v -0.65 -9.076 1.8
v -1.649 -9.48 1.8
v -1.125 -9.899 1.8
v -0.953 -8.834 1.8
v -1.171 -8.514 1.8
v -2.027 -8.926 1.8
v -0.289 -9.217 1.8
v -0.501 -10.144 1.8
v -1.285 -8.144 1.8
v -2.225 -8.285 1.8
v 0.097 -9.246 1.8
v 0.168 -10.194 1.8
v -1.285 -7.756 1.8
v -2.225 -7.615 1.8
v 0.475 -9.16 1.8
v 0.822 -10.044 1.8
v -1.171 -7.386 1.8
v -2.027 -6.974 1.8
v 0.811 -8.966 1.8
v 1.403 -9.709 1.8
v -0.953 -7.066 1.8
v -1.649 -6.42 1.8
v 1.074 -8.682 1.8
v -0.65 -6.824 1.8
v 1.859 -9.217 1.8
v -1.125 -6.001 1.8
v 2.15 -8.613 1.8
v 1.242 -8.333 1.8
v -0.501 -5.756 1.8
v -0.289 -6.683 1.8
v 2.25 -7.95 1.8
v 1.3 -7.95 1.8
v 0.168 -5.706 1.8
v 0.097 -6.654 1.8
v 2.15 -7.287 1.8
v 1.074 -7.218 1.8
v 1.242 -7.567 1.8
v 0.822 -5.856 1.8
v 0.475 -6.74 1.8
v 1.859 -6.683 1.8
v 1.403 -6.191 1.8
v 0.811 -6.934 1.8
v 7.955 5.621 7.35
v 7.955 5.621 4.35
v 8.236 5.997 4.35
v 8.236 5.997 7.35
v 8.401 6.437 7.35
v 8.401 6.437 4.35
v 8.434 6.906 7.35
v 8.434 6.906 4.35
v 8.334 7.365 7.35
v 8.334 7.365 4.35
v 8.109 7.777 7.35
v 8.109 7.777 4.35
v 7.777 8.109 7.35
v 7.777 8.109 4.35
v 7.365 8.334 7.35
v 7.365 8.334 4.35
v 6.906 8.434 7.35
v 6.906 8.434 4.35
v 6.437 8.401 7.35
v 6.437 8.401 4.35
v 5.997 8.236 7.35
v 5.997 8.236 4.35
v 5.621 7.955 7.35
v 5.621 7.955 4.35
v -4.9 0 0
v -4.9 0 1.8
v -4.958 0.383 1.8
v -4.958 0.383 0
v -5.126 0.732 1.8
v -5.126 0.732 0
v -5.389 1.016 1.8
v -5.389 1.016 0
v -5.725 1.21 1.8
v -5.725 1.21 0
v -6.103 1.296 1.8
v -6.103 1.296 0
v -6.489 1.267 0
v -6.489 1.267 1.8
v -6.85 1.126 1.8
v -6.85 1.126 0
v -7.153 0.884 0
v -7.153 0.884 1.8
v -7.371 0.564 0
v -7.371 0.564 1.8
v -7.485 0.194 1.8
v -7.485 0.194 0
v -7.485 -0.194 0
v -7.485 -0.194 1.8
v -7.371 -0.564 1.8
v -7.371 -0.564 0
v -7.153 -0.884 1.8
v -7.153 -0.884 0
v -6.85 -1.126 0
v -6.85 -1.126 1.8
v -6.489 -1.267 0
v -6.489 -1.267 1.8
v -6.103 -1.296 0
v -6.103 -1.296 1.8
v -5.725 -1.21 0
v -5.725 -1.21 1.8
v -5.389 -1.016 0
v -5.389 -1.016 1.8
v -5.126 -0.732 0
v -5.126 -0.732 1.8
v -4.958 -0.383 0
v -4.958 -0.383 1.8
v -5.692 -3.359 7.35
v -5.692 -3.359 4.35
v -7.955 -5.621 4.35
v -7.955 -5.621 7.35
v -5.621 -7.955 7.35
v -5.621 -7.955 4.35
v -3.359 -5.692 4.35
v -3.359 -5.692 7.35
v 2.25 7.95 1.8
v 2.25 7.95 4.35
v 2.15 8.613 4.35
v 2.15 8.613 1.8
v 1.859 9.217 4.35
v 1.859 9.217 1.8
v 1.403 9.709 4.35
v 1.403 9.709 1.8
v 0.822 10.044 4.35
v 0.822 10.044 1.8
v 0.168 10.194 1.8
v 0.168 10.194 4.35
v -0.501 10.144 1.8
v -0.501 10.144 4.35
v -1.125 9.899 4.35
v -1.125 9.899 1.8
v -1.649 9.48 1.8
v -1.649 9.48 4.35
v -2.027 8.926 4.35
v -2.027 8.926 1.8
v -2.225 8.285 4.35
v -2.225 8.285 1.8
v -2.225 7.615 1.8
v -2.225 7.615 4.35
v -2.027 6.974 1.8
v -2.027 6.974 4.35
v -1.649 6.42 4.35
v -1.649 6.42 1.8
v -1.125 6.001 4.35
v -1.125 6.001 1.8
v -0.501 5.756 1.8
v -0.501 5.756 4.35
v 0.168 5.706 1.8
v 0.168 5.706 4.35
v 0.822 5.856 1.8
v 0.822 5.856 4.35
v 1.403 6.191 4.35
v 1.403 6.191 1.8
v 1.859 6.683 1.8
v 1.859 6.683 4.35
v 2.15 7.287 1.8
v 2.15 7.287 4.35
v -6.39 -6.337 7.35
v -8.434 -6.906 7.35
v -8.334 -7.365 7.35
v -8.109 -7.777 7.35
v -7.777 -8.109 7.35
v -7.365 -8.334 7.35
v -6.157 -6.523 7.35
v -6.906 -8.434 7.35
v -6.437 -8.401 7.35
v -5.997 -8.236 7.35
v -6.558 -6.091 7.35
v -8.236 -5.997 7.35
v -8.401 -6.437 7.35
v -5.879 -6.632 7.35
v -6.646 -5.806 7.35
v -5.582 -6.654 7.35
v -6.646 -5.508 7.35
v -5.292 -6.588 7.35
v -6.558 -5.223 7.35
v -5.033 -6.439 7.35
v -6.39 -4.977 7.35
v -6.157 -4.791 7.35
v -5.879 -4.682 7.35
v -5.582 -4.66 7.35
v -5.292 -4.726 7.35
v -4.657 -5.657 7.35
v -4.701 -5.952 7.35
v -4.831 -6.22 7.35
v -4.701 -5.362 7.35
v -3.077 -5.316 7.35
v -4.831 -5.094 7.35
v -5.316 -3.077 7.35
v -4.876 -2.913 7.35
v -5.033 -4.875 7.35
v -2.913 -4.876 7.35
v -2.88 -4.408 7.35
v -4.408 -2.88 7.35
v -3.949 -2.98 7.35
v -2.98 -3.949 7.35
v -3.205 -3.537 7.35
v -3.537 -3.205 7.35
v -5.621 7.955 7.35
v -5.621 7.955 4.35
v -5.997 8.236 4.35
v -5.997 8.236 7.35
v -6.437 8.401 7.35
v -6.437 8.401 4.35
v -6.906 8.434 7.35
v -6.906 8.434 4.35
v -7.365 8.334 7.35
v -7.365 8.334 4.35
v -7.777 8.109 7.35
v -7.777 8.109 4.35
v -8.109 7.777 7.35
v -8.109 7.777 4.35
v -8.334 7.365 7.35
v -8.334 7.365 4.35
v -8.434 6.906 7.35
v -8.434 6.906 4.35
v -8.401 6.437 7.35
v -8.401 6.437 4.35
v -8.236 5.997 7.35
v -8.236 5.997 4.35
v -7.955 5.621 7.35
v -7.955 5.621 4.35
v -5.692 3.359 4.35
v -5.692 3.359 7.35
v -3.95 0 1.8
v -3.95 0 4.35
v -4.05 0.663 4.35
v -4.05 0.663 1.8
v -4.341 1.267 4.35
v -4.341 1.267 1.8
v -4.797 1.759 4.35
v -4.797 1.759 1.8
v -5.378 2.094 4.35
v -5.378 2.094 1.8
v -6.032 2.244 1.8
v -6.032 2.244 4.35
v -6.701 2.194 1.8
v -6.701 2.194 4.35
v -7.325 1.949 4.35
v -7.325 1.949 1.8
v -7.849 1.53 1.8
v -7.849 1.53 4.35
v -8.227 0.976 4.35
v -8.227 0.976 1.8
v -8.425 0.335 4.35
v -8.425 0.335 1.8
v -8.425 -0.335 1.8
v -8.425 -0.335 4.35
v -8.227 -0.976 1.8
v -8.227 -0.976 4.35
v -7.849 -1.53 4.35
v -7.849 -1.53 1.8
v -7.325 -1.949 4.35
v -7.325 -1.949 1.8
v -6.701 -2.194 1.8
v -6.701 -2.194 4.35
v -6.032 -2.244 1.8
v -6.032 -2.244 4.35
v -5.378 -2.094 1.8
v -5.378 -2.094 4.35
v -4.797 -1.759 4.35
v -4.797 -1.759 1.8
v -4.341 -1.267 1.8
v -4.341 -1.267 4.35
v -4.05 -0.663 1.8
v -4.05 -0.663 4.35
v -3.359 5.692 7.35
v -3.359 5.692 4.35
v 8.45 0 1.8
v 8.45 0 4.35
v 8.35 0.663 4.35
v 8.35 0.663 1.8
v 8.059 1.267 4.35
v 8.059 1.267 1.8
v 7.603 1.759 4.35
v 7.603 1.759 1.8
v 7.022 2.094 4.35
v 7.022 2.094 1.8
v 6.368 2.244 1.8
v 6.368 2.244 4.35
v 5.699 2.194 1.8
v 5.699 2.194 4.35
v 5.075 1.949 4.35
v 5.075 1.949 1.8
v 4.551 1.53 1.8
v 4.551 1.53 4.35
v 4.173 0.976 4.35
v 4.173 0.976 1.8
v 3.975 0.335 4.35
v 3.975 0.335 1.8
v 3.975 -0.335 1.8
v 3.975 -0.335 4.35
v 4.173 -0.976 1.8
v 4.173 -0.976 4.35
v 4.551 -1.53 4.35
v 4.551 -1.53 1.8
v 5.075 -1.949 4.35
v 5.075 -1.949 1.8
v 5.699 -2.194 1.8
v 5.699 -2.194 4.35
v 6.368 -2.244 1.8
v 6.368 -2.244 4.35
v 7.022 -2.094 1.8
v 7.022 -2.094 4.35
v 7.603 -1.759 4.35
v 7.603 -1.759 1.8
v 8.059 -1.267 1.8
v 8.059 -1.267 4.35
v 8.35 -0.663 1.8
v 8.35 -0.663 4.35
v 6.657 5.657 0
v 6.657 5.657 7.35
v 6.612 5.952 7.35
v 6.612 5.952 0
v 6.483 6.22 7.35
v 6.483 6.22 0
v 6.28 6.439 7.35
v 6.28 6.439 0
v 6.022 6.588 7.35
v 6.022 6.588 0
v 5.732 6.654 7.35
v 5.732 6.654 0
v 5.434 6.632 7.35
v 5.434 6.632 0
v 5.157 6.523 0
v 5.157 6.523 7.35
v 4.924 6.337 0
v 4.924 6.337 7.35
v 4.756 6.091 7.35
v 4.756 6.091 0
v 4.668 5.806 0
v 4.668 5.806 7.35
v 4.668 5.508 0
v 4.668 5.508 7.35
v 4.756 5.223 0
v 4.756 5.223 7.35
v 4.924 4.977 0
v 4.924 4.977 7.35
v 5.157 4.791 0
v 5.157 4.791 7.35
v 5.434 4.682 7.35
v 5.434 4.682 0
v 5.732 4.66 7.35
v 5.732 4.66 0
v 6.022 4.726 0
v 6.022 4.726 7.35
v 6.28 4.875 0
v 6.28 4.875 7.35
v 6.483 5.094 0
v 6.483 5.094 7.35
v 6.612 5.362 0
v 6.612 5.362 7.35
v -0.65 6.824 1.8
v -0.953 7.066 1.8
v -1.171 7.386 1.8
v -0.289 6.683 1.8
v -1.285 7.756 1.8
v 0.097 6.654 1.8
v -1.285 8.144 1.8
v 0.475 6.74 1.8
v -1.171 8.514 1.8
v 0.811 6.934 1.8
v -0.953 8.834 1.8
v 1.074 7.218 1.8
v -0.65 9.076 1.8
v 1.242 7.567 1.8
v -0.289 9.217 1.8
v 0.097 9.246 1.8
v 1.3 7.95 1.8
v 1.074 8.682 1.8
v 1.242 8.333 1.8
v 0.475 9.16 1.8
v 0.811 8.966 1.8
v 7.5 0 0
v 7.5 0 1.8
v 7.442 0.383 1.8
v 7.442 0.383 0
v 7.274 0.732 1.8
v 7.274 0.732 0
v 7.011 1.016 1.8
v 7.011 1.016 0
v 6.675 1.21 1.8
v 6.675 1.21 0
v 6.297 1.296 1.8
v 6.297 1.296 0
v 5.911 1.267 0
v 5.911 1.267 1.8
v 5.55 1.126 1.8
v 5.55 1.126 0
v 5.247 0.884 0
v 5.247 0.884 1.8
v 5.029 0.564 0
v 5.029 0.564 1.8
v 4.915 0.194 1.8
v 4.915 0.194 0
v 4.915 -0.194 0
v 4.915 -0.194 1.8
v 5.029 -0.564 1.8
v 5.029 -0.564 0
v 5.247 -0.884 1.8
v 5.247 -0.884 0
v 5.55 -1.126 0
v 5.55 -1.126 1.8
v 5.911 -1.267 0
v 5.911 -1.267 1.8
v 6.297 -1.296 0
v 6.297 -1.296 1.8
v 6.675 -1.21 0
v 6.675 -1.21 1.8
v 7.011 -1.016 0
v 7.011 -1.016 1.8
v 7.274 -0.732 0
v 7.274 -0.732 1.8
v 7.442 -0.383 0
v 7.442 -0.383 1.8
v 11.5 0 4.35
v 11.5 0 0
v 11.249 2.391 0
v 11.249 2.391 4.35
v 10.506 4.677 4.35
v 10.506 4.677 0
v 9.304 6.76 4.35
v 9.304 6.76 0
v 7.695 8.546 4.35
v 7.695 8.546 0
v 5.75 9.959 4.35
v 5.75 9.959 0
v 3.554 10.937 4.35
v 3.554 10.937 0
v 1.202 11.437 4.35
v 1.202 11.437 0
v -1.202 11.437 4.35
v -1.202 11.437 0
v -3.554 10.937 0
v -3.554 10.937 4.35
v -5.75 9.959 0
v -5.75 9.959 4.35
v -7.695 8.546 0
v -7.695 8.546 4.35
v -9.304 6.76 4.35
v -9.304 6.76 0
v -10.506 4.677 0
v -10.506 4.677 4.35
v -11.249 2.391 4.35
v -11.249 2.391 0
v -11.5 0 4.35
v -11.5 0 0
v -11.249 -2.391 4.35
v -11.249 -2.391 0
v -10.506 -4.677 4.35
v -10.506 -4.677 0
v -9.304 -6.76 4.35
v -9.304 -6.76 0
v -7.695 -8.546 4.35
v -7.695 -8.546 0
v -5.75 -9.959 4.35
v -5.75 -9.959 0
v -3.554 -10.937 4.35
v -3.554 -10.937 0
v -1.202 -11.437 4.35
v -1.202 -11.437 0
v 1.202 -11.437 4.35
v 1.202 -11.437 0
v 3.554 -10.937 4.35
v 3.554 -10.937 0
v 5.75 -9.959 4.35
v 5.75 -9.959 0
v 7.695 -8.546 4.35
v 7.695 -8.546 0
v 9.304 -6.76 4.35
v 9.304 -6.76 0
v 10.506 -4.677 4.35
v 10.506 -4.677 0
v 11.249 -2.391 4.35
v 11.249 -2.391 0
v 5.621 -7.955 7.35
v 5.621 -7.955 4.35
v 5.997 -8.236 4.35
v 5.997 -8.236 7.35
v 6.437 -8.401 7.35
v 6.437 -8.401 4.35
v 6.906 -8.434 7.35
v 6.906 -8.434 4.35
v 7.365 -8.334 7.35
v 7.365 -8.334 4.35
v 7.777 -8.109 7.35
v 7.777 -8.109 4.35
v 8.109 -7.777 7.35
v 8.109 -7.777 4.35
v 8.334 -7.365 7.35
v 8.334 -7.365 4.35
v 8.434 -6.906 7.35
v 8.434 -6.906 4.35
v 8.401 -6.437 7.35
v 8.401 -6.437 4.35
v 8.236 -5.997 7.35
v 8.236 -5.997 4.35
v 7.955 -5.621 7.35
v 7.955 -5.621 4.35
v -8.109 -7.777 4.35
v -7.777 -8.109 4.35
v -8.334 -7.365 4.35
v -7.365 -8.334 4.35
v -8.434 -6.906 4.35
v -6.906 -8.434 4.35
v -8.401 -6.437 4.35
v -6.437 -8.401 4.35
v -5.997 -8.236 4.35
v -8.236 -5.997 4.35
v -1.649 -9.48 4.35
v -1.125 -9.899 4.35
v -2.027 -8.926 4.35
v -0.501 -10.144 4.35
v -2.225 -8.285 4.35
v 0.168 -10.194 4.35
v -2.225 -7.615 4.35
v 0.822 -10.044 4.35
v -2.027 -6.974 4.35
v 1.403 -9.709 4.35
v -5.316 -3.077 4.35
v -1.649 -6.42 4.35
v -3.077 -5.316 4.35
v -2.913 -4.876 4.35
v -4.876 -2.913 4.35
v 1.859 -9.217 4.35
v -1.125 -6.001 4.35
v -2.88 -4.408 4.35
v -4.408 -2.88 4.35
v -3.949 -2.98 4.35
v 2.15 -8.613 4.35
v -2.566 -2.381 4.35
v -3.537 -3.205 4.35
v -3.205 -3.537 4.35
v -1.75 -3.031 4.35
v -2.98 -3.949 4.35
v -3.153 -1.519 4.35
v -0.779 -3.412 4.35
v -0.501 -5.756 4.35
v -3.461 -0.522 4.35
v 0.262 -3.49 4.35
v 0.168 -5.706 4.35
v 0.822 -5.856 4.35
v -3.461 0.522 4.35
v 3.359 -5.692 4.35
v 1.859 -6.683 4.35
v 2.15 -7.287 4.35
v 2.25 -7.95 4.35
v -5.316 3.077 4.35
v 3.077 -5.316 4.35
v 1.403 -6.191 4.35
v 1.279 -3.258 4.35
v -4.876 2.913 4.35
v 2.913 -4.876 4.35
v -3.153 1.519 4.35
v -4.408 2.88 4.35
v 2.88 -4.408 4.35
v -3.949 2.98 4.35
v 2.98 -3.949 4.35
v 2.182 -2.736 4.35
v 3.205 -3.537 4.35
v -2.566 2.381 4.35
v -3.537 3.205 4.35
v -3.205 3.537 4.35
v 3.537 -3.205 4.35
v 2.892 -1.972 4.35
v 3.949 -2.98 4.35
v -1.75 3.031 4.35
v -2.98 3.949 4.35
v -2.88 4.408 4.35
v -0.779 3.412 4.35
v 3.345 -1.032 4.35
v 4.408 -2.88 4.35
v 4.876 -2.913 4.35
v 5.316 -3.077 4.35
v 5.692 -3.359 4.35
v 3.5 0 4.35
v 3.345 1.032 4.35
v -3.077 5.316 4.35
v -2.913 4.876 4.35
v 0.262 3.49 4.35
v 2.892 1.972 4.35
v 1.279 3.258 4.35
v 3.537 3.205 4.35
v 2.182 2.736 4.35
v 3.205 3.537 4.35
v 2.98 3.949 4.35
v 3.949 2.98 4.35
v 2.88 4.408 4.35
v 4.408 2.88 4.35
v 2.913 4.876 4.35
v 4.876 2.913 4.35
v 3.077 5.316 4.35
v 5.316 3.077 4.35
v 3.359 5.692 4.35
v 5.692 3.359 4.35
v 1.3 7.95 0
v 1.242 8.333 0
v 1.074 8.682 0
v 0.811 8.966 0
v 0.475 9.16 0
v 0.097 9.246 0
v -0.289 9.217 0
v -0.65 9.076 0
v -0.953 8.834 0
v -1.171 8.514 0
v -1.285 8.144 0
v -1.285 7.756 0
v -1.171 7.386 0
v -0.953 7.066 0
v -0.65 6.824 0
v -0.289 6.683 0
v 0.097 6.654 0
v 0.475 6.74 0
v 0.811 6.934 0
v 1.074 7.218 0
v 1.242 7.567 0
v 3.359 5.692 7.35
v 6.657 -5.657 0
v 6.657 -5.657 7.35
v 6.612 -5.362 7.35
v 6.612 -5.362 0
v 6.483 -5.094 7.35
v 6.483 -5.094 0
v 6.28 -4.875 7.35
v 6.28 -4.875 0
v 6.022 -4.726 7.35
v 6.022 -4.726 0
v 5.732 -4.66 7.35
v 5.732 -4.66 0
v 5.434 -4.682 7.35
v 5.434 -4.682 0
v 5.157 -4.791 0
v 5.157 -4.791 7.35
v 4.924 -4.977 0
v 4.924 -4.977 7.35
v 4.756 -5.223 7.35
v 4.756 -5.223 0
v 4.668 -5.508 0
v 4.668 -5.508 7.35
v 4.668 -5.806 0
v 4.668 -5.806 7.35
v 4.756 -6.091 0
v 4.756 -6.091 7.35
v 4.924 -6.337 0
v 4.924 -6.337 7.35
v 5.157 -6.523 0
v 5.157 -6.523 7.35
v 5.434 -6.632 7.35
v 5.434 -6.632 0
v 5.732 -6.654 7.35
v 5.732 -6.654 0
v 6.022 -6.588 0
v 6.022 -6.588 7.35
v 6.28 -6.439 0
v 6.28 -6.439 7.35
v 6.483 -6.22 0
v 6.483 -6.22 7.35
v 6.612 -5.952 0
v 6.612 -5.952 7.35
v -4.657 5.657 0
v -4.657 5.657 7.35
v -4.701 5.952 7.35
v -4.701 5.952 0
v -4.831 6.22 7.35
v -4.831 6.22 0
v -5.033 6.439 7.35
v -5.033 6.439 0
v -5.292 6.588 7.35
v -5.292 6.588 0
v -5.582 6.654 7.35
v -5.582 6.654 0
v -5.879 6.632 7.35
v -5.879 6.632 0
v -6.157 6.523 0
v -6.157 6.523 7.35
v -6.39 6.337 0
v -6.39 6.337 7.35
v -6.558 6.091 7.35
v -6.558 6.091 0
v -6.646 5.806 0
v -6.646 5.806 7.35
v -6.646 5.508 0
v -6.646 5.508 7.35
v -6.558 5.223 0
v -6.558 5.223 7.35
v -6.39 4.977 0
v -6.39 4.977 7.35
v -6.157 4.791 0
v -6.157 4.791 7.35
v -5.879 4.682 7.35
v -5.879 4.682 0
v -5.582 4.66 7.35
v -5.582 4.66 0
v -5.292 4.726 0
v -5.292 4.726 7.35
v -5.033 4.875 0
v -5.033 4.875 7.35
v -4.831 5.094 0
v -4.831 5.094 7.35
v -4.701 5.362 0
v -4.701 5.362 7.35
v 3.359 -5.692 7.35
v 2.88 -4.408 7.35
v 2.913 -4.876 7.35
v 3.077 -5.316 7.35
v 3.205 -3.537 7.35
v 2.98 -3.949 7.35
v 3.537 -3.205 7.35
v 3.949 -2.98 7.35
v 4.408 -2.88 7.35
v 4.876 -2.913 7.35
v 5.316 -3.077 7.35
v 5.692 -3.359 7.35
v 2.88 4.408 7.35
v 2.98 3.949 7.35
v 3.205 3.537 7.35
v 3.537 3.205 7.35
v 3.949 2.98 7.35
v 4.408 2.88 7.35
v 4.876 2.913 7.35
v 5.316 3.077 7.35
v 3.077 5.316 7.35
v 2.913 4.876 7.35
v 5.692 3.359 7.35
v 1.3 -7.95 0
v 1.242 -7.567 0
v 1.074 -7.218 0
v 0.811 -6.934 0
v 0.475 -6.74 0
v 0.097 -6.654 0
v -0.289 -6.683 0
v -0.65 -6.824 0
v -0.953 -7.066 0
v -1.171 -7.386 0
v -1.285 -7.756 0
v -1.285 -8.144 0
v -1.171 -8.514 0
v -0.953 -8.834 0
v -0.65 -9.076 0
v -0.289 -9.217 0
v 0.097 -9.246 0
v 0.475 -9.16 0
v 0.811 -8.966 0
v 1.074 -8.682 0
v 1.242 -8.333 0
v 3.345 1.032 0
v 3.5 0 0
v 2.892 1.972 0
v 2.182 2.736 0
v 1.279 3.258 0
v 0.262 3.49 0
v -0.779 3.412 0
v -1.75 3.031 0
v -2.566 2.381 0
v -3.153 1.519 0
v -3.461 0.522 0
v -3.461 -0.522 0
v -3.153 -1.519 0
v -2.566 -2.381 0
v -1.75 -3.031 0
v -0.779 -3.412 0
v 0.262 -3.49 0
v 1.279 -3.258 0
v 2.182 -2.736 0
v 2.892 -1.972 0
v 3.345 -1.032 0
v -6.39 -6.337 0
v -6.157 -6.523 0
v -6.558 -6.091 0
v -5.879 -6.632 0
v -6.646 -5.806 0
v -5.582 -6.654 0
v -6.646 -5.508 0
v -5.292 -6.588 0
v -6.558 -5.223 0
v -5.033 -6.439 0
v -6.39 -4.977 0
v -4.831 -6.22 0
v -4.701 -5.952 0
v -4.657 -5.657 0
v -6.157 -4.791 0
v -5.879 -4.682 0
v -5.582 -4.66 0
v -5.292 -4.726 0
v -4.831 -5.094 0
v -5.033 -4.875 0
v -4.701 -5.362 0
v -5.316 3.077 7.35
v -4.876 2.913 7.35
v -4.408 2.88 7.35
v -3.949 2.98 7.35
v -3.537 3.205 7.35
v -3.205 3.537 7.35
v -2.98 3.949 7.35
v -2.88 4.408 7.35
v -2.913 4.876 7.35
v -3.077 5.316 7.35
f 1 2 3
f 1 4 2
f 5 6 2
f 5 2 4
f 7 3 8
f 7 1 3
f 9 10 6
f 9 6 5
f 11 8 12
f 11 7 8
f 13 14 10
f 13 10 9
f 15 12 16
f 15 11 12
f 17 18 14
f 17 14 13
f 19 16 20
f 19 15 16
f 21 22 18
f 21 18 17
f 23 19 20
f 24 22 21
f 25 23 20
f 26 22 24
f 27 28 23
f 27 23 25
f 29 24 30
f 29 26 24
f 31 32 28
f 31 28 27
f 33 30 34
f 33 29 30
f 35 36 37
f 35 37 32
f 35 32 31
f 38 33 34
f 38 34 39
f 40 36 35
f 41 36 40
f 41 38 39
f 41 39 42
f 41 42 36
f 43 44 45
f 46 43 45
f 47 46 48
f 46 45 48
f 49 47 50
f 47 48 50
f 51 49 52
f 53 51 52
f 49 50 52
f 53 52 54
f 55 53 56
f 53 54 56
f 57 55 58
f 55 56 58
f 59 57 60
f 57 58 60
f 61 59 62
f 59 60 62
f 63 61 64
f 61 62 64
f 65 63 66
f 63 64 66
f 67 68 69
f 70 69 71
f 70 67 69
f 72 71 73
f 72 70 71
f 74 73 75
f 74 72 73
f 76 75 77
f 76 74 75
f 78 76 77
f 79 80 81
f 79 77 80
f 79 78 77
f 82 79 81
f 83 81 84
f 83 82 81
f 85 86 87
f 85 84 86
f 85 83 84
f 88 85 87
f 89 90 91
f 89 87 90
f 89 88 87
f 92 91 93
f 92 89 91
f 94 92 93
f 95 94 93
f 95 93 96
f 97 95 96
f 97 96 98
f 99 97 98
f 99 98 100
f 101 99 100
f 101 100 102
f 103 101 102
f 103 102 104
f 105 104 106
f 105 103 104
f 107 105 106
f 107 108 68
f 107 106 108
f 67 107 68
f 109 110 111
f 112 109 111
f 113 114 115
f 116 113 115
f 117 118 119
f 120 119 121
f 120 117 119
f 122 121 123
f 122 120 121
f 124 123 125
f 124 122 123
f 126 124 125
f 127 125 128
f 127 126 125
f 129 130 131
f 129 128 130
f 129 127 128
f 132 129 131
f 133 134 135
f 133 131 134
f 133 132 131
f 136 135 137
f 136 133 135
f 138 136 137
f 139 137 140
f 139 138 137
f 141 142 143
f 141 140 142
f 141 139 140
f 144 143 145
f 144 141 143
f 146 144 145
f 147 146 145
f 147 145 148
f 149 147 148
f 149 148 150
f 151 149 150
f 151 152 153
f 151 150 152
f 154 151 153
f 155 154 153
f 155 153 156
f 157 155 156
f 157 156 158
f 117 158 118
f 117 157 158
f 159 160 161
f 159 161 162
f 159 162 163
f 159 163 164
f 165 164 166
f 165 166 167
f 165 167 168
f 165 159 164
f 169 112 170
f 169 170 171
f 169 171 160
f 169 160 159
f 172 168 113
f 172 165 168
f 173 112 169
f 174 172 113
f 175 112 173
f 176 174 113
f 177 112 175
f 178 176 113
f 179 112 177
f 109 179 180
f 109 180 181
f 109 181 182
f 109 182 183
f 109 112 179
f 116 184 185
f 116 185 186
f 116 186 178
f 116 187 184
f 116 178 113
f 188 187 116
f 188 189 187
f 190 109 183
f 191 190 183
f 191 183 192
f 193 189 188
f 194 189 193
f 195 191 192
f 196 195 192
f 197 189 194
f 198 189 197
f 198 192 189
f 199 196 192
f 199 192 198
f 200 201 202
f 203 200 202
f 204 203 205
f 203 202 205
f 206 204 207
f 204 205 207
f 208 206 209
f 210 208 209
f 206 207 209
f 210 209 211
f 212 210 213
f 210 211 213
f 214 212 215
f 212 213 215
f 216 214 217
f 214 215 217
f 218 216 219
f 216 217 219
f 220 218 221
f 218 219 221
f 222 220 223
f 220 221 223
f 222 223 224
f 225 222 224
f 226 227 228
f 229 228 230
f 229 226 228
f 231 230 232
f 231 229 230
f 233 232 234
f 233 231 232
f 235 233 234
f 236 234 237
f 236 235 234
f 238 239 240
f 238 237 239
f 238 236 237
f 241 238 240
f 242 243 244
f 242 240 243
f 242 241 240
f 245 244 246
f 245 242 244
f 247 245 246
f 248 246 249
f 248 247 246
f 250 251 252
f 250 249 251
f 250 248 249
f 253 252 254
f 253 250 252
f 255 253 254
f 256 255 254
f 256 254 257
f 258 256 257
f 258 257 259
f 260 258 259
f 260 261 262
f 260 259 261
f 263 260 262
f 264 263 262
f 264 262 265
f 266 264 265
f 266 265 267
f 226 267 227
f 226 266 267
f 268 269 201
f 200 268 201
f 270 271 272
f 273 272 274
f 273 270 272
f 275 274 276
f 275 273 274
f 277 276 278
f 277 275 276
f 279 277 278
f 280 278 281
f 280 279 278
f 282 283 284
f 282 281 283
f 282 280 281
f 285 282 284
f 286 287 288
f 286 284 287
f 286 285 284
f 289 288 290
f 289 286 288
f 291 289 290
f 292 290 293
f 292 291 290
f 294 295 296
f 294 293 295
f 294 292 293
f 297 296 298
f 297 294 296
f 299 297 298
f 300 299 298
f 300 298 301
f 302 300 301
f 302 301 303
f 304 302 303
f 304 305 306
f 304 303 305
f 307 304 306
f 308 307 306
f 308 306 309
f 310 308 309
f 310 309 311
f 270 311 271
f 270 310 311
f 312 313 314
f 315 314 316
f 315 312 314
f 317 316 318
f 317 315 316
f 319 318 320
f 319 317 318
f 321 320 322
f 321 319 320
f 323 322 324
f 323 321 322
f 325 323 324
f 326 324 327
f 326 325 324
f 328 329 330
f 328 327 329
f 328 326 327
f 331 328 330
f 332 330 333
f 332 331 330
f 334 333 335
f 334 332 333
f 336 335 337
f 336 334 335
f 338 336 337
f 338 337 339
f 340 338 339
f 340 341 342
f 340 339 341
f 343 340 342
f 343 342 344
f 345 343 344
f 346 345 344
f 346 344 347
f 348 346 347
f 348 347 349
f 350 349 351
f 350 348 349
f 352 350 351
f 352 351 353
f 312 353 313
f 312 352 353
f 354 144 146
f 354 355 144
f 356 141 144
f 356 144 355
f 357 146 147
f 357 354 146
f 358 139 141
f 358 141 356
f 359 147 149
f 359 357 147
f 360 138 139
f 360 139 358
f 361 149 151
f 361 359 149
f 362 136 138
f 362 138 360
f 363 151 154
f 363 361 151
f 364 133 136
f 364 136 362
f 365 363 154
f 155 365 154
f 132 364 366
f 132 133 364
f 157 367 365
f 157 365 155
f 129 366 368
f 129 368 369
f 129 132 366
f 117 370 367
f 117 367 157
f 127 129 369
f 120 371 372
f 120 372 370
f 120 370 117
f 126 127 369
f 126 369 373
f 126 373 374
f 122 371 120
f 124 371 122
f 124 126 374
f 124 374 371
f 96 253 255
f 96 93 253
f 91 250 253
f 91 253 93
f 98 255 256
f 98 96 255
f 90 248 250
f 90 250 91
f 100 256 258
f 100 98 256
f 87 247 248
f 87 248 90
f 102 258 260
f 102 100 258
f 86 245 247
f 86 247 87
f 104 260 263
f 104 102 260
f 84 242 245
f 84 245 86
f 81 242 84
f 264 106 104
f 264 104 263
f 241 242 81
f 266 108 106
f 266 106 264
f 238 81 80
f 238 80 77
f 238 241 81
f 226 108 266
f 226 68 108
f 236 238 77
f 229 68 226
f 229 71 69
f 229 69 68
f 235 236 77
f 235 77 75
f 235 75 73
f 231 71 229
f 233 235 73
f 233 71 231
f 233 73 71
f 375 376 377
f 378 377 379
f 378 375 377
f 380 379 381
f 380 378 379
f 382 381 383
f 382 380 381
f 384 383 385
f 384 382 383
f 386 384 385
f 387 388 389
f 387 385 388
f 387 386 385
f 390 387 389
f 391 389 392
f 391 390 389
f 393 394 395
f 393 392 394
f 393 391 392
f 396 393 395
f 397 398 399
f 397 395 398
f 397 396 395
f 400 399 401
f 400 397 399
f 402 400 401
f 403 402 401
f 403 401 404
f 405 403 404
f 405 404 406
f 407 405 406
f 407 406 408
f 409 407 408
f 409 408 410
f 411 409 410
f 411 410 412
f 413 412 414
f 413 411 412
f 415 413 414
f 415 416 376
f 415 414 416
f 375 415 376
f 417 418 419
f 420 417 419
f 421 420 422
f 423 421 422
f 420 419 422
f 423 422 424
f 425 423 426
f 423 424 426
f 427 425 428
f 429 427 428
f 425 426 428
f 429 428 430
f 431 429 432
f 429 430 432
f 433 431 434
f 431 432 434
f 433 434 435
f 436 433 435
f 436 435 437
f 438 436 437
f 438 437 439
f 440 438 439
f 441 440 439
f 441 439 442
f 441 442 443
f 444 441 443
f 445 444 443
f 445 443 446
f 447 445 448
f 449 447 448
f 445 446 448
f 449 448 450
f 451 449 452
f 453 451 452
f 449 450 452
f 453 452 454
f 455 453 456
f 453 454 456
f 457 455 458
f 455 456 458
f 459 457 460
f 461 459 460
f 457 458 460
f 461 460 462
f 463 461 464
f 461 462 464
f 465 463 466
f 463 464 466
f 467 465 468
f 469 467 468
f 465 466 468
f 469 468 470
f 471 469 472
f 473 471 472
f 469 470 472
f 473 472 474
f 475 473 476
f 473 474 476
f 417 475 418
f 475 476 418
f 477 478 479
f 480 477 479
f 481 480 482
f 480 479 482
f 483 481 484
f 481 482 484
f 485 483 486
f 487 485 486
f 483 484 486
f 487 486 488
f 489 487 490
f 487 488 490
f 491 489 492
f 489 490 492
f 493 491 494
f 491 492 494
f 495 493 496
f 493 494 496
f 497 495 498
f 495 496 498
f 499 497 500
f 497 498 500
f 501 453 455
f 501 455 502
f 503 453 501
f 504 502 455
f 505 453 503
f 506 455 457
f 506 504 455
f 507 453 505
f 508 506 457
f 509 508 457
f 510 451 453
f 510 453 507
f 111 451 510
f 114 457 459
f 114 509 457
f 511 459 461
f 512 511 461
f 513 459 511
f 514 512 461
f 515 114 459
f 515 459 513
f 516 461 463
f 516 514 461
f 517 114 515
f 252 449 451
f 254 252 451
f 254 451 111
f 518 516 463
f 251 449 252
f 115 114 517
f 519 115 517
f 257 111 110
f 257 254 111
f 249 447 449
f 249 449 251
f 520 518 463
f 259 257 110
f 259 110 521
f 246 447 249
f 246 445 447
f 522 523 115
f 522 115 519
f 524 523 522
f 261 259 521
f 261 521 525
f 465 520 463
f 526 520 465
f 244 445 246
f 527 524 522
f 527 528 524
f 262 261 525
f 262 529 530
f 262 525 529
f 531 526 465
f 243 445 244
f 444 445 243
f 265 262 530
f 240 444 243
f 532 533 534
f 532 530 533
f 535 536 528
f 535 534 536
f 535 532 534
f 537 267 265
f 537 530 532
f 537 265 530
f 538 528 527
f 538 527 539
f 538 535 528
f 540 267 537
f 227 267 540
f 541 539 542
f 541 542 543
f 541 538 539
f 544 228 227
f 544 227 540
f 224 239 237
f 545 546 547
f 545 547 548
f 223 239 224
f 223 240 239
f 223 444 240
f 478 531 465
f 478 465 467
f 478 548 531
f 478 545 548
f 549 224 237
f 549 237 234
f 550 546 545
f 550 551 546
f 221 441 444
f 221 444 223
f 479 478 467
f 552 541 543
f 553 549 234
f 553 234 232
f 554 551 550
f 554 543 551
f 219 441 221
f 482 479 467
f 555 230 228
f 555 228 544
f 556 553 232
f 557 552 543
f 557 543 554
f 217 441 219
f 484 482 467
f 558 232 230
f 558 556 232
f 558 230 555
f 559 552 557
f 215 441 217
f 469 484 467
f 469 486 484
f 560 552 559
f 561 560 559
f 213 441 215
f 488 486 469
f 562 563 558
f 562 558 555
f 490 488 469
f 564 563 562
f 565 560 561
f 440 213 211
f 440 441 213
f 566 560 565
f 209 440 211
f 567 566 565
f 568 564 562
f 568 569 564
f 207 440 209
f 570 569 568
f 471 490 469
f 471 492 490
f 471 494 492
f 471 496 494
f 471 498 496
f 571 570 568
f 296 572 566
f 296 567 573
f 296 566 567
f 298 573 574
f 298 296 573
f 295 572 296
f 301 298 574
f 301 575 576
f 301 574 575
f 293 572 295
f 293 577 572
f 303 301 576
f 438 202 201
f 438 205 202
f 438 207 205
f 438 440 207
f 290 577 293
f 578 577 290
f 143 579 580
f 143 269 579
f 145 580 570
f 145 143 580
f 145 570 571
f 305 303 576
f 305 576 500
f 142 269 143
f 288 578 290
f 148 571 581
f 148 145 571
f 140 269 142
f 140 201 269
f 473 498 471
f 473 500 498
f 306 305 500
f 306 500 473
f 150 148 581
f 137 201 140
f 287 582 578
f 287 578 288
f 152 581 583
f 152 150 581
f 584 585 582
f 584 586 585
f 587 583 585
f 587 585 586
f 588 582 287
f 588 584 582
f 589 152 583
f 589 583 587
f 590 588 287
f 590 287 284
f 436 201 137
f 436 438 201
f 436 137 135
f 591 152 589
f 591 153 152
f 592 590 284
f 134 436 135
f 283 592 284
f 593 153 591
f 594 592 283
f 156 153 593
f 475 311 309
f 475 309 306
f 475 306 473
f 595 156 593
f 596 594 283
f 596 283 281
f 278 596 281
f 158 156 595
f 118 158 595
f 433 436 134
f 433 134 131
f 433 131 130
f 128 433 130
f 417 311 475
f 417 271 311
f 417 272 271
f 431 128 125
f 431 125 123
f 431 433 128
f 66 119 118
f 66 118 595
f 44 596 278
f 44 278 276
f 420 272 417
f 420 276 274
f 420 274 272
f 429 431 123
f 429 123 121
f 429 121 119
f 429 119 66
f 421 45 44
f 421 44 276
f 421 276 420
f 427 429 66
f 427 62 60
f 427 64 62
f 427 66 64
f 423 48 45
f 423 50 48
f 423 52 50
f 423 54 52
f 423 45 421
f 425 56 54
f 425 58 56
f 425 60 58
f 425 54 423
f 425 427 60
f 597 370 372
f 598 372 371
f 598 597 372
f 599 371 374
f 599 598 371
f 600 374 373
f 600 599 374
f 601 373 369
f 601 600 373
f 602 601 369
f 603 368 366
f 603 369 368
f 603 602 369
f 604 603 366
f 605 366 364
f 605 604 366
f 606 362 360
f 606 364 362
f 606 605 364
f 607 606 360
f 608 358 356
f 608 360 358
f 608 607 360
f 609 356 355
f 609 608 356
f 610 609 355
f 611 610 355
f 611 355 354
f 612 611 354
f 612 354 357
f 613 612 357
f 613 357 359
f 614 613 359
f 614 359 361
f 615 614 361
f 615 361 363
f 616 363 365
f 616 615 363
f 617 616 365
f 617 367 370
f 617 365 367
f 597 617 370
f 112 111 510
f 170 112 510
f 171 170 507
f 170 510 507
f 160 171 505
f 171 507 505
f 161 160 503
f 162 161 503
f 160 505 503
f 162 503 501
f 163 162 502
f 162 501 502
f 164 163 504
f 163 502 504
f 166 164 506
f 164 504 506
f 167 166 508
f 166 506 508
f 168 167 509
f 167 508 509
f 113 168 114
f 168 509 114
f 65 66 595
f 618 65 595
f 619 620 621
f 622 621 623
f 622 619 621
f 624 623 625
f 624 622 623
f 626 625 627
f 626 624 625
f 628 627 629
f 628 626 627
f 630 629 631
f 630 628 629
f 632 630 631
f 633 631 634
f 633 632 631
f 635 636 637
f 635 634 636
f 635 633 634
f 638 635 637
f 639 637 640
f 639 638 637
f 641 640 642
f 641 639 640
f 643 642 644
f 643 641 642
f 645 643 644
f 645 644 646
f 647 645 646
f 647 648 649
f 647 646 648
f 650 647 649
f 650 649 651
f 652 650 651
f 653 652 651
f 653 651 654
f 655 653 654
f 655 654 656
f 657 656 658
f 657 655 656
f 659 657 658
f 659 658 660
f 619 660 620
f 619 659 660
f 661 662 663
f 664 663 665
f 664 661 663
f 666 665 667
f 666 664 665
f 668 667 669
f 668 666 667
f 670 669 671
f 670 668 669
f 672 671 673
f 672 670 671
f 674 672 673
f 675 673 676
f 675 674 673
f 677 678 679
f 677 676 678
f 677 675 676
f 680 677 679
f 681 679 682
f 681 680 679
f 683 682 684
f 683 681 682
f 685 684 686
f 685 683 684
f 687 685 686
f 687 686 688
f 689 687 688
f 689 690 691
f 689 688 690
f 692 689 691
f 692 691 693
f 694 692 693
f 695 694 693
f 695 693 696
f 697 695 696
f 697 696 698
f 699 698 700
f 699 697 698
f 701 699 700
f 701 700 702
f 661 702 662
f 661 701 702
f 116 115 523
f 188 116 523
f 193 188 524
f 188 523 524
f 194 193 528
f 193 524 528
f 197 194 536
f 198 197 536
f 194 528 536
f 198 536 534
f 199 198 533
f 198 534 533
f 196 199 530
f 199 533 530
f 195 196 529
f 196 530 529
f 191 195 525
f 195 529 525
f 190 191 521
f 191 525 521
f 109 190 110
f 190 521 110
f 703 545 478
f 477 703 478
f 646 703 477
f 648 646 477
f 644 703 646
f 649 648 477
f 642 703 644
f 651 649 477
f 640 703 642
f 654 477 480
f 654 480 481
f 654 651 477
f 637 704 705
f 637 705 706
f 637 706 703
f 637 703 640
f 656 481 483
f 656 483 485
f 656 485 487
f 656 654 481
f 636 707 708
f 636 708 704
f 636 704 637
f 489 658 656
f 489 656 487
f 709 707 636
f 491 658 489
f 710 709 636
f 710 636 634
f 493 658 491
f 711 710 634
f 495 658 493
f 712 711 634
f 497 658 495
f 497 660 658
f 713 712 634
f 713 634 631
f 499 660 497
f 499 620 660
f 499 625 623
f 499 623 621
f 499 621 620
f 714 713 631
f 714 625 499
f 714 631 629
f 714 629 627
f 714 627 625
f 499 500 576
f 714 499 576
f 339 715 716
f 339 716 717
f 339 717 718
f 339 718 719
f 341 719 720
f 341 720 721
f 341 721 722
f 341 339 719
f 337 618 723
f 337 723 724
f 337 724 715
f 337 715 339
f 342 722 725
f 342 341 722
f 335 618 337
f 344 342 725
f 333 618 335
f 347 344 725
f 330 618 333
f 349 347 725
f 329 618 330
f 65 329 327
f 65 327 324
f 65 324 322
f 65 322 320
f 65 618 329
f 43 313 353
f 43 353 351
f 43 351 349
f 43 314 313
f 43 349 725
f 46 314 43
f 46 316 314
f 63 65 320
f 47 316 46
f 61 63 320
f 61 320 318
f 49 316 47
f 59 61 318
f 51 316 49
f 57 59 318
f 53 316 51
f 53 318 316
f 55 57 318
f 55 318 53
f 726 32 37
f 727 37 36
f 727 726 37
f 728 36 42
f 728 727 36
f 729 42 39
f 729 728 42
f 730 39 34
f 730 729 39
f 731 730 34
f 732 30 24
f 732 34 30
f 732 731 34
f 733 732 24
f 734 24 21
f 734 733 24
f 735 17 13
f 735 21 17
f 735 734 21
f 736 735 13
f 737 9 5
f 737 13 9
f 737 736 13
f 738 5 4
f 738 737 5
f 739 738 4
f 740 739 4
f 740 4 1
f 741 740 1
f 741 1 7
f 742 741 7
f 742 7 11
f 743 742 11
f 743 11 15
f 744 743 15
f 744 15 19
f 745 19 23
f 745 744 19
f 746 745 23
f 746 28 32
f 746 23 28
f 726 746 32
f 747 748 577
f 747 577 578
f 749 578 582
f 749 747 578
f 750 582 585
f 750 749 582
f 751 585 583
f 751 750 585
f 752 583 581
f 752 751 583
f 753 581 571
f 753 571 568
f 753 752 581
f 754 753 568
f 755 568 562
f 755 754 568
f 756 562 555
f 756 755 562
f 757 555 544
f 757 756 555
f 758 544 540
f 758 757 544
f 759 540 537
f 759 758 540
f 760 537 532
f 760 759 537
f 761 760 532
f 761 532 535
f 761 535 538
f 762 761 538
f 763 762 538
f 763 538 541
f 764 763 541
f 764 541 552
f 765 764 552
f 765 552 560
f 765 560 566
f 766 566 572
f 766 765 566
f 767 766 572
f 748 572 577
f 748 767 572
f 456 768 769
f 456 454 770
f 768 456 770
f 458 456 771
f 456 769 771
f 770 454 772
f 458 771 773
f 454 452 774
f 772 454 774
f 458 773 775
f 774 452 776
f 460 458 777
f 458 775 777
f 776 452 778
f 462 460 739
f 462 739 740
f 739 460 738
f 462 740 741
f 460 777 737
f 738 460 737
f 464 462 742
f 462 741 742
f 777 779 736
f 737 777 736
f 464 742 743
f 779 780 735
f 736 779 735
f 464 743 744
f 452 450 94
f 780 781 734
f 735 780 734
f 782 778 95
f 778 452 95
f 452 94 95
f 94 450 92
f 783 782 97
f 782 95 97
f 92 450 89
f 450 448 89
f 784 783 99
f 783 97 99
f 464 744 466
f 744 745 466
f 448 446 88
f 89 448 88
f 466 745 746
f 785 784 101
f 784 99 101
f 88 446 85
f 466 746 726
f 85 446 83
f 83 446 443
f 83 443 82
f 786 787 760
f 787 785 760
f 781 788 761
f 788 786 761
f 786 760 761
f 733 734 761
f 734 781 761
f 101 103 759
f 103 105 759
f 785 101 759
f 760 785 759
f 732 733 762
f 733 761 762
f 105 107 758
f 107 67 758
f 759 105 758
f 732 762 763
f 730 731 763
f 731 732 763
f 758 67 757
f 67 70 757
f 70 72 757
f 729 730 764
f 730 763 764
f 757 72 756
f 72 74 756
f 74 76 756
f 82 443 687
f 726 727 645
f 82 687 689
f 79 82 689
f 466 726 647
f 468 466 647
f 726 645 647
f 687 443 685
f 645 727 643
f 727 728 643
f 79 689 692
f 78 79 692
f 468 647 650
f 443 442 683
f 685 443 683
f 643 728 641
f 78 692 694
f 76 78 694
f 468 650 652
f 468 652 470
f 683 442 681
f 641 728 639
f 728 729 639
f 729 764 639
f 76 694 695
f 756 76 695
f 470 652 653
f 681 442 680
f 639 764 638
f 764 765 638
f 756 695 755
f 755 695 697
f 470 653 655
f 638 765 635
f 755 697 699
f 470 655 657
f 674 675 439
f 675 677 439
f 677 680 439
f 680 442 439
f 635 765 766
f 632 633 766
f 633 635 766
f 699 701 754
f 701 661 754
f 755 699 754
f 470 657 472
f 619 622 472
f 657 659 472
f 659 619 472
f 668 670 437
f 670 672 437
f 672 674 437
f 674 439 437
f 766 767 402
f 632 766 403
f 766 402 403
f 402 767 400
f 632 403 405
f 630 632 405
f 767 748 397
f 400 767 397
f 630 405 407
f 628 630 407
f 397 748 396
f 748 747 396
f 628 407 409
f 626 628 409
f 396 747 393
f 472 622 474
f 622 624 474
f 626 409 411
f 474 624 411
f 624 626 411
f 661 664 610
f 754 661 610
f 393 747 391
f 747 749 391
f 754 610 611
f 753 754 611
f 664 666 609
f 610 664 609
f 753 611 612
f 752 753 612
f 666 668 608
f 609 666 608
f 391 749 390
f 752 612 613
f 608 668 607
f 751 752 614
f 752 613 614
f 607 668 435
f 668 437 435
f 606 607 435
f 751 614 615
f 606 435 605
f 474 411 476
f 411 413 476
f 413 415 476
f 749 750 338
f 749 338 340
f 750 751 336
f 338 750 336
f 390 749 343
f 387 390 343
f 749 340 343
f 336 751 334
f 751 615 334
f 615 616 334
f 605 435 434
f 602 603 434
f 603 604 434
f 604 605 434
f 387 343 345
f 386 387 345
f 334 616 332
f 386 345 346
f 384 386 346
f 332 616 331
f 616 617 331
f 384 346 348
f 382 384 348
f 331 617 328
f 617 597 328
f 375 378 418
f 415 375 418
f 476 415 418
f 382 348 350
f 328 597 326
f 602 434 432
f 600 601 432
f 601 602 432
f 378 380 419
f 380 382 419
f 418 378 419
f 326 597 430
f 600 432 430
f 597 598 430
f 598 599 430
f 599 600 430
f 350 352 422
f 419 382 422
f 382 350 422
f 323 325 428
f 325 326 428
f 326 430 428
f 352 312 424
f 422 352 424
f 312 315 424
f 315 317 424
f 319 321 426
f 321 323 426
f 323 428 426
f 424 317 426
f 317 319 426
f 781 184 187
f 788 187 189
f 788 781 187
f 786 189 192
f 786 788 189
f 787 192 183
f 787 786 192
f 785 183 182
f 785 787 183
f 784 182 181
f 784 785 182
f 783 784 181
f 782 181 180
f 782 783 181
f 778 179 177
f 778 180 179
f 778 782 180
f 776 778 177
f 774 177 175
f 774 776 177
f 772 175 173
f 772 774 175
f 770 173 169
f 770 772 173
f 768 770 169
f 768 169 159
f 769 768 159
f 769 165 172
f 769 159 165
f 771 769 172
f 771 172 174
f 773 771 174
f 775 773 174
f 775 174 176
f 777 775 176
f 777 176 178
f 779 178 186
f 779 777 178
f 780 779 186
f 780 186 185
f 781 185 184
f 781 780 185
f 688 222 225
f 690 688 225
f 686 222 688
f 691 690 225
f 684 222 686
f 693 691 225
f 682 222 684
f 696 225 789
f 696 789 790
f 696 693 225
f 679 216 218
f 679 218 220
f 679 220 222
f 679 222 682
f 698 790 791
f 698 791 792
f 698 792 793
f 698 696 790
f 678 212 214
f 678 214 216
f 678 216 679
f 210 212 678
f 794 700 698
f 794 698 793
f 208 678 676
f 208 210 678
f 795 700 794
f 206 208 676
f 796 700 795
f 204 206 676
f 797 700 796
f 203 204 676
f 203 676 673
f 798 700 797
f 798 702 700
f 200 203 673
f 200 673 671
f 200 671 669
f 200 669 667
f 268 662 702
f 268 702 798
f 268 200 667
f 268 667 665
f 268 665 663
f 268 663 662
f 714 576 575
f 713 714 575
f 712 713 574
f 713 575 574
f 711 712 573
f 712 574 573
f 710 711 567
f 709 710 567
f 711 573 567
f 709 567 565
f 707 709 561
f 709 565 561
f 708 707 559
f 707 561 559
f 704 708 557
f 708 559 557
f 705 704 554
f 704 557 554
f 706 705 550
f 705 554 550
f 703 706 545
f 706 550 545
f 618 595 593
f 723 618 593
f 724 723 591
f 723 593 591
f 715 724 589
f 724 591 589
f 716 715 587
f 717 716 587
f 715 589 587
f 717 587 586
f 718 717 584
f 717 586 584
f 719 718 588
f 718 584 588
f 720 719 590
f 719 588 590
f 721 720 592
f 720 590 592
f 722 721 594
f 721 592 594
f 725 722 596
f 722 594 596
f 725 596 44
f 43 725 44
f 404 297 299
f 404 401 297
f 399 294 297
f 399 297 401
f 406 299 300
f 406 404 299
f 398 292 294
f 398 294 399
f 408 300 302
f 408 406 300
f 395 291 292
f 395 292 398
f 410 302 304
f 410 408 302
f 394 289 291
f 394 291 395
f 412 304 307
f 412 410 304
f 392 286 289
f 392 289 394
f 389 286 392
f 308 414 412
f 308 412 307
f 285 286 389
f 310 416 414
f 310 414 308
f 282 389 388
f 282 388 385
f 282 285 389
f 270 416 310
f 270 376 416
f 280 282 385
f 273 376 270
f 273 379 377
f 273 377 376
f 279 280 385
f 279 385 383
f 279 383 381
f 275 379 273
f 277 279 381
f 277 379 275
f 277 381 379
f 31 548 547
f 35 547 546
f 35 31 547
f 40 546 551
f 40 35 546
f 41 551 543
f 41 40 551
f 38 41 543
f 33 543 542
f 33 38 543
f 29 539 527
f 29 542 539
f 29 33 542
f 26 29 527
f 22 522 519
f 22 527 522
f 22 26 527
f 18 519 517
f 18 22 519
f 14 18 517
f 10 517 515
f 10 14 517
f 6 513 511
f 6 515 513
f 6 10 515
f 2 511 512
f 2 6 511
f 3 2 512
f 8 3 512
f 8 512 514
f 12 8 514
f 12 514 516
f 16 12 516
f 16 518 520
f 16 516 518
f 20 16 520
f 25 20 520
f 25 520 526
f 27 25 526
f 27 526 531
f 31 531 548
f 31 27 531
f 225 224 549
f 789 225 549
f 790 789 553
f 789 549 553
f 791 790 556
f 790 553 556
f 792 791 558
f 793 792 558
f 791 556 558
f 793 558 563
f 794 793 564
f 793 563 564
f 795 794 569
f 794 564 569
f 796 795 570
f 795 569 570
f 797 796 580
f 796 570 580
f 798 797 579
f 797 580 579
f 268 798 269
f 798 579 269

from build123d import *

# Parameters (mm, degrees)
F0_R     = 11.5
F0_R_2   = 1.3
F0_R_3   = 3.5
F1_DEPTH = 4.35
F4_DEPTH = 3
F6_R     = 2.25
F7_DEPTH = 2.6
F8_R     = 1
F9_DEPTH = 8


with BuildPart() as f1:
    # F0 (on Top) → F1 (new body)
    with BuildSketch(Plane.XY):
        Circle(F0_R)
        with Locations((0, -7.95)):
            Circle(F0_R_2, mode=Mode.SUBTRACT)
        with Locations((-6.2, 0)):
            Circle(F0_R_2, mode=Mode.SUBTRACT)
        Circle(F0_R_3, mode=Mode.SUBTRACT)
        with Locations((6.2, 0)):
            Circle(F0_R_2, mode=Mode.SUBTRACT)
        with Locations((0, 7.95)):
            Circle(F0_R_2, mode=Mode.SUBTRACT)
    extrude(amount=F1_DEPTH)

    # F3 (on offset) → F4 (join)
    with BuildSketch(Plane.XY.offset(4.35)):
        with BuildLine():
            ThreePointArc((5.69221, -3.358757), (3.358757, -3.358757), (3.358757, -5.69221))
            Line((3.358757, -5.69221), (5.621499, -7.954951))
            ThreePointArc((5.621499, -7.954951), (7.954951, -7.954951), (7.954951, -5.621499))
            Line((7.954951, -5.621499), (5.69221, -3.358757))
        make_face()
        with BuildLine():
            ThreePointArc((3.358757, 5.69221), (3.358757, 3.358757), (5.69221, 3.358757))
            Line((5.69221, 3.358757), (7.954951, 5.621499))
            ThreePointArc((7.954951, 5.621499), (7.954951, 7.954951), (5.621499, 7.954951))
            Line((5.621499, 7.954951), (3.358757, 5.69221))
        make_face()
        with BuildLine():
            ThreePointArc((-5.69221, 3.358757), (-3.358757, 3.358757), (-3.358757, 5.69221))
            Line((-3.358757, 5.69221), (-5.621499, 7.954951))
            ThreePointArc((-5.621499, 7.954951), (-7.954951, 7.954951), (-7.954951, 5.621499))
            Line((-7.954951, 5.621499), (-5.69221, 3.358757))
        make_face()
        with BuildLine():
            ThreePointArc((-3.358757, -5.69221), (-3.358757, -3.358757), (-5.69221, -3.358757))
            Line((-5.69221, -3.358757), (-7.954951, -5.621499))
            ThreePointArc((-7.954951, -5.621499), (-7.954951, -7.954951), (-5.621499, -7.954951))
            Line((-5.621499, -7.954951), (-3.358757, -5.69221))
        make_face()
    extrude(amount=F4_DEPTH)

    # F6 (on offset) → F7 (cut)
    with BuildSketch(Plane.XY.offset(1.8)):
        with Locations((0, -7.95)):
            Circle(F6_R)
        with Locations((6.2, 0)):
            Circle(F6_R)
        with Locations((0, 7.95)):
            Circle(F6_R)
        with Locations((-6.2, 0)):
            Circle(F6_R)
    extrude(amount=F7_DEPTH, mode=Mode.SUBTRACT)

    # F8 (on Top) → F9 (cut)
    with BuildSketch(Plane.XY):
        with Locations((5.656854, -5.656854)):
            Circle(F8_R)
        with Locations((5.656854, 5.656854)):
            Circle(F8_R)
        with Locations((-5.656854, 5.656854)):
            Circle(F8_R)
        with Locations((-5.656854, -5.656854)):
            Circle(F8_R)
    extrude(amount=F9_DEPTH, mode=Mode.SUBTRACT)


solid = f1.part
